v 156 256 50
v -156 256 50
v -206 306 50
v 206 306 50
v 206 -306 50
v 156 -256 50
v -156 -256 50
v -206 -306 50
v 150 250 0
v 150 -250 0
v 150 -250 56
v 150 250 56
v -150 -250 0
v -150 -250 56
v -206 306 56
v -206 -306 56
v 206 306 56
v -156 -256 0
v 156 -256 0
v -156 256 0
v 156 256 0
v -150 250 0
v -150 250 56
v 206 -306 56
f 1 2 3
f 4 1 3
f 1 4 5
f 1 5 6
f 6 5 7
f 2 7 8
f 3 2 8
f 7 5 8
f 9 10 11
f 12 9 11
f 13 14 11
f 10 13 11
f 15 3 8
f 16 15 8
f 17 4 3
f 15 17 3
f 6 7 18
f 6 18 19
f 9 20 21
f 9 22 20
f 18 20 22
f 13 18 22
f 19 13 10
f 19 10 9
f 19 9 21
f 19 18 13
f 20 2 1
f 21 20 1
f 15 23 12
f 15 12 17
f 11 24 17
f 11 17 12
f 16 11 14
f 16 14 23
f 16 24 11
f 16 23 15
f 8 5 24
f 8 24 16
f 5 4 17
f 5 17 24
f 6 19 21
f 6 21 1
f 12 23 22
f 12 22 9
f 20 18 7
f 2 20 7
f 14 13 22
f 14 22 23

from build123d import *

# Parameters (mm, degrees)
SKETCH045_W  = 300
SKETCH045_H  = 60
PAD007_DEPTH = 250
SKETCH046_W  = 312
SKETCH046_H  = 50
PAD008_DEPTH = 256
SKETCH047_W  = 412
SKETCH047_H  = 612
PAD009_DEPTH = 6


with BuildPart() as body008:
    # Sketch045 → Pad007 (new body, symmetric)
    with BuildSketch(Plane.XZ):
        with Locations((0, 30)):
            Rectangle(SKETCH045_W, SKETCH045_H)
    extrude(amount=PAD007_DEPTH, both=True)


with BuildPart() as cut005:
    # Sketch046 → Pad008 (new body, symmetric)
    with BuildSketch(Plane.XZ):
        with Locations((0, 25)):
            Rectangle(SKETCH046_W, SKETCH046_H)
    extrude(amount=PAD008_DEPTH, both=True)

    # Sketch047 (on Face3 of Pad008) → Pad009 (join)
    with BuildSketch(Plane(origin=(0, 0, 50), x_dir=(-1, 0, 0), z_dir=(0, 0, 1))):
        Rectangle(SKETCH047_W, SKETCH047_H)
    extrude(amount=PAD009_DEPTH)

    # Cut005: cut Body008
    add(body008.part, mode=Mode.SUBTRACT)


solid = cut005.part
